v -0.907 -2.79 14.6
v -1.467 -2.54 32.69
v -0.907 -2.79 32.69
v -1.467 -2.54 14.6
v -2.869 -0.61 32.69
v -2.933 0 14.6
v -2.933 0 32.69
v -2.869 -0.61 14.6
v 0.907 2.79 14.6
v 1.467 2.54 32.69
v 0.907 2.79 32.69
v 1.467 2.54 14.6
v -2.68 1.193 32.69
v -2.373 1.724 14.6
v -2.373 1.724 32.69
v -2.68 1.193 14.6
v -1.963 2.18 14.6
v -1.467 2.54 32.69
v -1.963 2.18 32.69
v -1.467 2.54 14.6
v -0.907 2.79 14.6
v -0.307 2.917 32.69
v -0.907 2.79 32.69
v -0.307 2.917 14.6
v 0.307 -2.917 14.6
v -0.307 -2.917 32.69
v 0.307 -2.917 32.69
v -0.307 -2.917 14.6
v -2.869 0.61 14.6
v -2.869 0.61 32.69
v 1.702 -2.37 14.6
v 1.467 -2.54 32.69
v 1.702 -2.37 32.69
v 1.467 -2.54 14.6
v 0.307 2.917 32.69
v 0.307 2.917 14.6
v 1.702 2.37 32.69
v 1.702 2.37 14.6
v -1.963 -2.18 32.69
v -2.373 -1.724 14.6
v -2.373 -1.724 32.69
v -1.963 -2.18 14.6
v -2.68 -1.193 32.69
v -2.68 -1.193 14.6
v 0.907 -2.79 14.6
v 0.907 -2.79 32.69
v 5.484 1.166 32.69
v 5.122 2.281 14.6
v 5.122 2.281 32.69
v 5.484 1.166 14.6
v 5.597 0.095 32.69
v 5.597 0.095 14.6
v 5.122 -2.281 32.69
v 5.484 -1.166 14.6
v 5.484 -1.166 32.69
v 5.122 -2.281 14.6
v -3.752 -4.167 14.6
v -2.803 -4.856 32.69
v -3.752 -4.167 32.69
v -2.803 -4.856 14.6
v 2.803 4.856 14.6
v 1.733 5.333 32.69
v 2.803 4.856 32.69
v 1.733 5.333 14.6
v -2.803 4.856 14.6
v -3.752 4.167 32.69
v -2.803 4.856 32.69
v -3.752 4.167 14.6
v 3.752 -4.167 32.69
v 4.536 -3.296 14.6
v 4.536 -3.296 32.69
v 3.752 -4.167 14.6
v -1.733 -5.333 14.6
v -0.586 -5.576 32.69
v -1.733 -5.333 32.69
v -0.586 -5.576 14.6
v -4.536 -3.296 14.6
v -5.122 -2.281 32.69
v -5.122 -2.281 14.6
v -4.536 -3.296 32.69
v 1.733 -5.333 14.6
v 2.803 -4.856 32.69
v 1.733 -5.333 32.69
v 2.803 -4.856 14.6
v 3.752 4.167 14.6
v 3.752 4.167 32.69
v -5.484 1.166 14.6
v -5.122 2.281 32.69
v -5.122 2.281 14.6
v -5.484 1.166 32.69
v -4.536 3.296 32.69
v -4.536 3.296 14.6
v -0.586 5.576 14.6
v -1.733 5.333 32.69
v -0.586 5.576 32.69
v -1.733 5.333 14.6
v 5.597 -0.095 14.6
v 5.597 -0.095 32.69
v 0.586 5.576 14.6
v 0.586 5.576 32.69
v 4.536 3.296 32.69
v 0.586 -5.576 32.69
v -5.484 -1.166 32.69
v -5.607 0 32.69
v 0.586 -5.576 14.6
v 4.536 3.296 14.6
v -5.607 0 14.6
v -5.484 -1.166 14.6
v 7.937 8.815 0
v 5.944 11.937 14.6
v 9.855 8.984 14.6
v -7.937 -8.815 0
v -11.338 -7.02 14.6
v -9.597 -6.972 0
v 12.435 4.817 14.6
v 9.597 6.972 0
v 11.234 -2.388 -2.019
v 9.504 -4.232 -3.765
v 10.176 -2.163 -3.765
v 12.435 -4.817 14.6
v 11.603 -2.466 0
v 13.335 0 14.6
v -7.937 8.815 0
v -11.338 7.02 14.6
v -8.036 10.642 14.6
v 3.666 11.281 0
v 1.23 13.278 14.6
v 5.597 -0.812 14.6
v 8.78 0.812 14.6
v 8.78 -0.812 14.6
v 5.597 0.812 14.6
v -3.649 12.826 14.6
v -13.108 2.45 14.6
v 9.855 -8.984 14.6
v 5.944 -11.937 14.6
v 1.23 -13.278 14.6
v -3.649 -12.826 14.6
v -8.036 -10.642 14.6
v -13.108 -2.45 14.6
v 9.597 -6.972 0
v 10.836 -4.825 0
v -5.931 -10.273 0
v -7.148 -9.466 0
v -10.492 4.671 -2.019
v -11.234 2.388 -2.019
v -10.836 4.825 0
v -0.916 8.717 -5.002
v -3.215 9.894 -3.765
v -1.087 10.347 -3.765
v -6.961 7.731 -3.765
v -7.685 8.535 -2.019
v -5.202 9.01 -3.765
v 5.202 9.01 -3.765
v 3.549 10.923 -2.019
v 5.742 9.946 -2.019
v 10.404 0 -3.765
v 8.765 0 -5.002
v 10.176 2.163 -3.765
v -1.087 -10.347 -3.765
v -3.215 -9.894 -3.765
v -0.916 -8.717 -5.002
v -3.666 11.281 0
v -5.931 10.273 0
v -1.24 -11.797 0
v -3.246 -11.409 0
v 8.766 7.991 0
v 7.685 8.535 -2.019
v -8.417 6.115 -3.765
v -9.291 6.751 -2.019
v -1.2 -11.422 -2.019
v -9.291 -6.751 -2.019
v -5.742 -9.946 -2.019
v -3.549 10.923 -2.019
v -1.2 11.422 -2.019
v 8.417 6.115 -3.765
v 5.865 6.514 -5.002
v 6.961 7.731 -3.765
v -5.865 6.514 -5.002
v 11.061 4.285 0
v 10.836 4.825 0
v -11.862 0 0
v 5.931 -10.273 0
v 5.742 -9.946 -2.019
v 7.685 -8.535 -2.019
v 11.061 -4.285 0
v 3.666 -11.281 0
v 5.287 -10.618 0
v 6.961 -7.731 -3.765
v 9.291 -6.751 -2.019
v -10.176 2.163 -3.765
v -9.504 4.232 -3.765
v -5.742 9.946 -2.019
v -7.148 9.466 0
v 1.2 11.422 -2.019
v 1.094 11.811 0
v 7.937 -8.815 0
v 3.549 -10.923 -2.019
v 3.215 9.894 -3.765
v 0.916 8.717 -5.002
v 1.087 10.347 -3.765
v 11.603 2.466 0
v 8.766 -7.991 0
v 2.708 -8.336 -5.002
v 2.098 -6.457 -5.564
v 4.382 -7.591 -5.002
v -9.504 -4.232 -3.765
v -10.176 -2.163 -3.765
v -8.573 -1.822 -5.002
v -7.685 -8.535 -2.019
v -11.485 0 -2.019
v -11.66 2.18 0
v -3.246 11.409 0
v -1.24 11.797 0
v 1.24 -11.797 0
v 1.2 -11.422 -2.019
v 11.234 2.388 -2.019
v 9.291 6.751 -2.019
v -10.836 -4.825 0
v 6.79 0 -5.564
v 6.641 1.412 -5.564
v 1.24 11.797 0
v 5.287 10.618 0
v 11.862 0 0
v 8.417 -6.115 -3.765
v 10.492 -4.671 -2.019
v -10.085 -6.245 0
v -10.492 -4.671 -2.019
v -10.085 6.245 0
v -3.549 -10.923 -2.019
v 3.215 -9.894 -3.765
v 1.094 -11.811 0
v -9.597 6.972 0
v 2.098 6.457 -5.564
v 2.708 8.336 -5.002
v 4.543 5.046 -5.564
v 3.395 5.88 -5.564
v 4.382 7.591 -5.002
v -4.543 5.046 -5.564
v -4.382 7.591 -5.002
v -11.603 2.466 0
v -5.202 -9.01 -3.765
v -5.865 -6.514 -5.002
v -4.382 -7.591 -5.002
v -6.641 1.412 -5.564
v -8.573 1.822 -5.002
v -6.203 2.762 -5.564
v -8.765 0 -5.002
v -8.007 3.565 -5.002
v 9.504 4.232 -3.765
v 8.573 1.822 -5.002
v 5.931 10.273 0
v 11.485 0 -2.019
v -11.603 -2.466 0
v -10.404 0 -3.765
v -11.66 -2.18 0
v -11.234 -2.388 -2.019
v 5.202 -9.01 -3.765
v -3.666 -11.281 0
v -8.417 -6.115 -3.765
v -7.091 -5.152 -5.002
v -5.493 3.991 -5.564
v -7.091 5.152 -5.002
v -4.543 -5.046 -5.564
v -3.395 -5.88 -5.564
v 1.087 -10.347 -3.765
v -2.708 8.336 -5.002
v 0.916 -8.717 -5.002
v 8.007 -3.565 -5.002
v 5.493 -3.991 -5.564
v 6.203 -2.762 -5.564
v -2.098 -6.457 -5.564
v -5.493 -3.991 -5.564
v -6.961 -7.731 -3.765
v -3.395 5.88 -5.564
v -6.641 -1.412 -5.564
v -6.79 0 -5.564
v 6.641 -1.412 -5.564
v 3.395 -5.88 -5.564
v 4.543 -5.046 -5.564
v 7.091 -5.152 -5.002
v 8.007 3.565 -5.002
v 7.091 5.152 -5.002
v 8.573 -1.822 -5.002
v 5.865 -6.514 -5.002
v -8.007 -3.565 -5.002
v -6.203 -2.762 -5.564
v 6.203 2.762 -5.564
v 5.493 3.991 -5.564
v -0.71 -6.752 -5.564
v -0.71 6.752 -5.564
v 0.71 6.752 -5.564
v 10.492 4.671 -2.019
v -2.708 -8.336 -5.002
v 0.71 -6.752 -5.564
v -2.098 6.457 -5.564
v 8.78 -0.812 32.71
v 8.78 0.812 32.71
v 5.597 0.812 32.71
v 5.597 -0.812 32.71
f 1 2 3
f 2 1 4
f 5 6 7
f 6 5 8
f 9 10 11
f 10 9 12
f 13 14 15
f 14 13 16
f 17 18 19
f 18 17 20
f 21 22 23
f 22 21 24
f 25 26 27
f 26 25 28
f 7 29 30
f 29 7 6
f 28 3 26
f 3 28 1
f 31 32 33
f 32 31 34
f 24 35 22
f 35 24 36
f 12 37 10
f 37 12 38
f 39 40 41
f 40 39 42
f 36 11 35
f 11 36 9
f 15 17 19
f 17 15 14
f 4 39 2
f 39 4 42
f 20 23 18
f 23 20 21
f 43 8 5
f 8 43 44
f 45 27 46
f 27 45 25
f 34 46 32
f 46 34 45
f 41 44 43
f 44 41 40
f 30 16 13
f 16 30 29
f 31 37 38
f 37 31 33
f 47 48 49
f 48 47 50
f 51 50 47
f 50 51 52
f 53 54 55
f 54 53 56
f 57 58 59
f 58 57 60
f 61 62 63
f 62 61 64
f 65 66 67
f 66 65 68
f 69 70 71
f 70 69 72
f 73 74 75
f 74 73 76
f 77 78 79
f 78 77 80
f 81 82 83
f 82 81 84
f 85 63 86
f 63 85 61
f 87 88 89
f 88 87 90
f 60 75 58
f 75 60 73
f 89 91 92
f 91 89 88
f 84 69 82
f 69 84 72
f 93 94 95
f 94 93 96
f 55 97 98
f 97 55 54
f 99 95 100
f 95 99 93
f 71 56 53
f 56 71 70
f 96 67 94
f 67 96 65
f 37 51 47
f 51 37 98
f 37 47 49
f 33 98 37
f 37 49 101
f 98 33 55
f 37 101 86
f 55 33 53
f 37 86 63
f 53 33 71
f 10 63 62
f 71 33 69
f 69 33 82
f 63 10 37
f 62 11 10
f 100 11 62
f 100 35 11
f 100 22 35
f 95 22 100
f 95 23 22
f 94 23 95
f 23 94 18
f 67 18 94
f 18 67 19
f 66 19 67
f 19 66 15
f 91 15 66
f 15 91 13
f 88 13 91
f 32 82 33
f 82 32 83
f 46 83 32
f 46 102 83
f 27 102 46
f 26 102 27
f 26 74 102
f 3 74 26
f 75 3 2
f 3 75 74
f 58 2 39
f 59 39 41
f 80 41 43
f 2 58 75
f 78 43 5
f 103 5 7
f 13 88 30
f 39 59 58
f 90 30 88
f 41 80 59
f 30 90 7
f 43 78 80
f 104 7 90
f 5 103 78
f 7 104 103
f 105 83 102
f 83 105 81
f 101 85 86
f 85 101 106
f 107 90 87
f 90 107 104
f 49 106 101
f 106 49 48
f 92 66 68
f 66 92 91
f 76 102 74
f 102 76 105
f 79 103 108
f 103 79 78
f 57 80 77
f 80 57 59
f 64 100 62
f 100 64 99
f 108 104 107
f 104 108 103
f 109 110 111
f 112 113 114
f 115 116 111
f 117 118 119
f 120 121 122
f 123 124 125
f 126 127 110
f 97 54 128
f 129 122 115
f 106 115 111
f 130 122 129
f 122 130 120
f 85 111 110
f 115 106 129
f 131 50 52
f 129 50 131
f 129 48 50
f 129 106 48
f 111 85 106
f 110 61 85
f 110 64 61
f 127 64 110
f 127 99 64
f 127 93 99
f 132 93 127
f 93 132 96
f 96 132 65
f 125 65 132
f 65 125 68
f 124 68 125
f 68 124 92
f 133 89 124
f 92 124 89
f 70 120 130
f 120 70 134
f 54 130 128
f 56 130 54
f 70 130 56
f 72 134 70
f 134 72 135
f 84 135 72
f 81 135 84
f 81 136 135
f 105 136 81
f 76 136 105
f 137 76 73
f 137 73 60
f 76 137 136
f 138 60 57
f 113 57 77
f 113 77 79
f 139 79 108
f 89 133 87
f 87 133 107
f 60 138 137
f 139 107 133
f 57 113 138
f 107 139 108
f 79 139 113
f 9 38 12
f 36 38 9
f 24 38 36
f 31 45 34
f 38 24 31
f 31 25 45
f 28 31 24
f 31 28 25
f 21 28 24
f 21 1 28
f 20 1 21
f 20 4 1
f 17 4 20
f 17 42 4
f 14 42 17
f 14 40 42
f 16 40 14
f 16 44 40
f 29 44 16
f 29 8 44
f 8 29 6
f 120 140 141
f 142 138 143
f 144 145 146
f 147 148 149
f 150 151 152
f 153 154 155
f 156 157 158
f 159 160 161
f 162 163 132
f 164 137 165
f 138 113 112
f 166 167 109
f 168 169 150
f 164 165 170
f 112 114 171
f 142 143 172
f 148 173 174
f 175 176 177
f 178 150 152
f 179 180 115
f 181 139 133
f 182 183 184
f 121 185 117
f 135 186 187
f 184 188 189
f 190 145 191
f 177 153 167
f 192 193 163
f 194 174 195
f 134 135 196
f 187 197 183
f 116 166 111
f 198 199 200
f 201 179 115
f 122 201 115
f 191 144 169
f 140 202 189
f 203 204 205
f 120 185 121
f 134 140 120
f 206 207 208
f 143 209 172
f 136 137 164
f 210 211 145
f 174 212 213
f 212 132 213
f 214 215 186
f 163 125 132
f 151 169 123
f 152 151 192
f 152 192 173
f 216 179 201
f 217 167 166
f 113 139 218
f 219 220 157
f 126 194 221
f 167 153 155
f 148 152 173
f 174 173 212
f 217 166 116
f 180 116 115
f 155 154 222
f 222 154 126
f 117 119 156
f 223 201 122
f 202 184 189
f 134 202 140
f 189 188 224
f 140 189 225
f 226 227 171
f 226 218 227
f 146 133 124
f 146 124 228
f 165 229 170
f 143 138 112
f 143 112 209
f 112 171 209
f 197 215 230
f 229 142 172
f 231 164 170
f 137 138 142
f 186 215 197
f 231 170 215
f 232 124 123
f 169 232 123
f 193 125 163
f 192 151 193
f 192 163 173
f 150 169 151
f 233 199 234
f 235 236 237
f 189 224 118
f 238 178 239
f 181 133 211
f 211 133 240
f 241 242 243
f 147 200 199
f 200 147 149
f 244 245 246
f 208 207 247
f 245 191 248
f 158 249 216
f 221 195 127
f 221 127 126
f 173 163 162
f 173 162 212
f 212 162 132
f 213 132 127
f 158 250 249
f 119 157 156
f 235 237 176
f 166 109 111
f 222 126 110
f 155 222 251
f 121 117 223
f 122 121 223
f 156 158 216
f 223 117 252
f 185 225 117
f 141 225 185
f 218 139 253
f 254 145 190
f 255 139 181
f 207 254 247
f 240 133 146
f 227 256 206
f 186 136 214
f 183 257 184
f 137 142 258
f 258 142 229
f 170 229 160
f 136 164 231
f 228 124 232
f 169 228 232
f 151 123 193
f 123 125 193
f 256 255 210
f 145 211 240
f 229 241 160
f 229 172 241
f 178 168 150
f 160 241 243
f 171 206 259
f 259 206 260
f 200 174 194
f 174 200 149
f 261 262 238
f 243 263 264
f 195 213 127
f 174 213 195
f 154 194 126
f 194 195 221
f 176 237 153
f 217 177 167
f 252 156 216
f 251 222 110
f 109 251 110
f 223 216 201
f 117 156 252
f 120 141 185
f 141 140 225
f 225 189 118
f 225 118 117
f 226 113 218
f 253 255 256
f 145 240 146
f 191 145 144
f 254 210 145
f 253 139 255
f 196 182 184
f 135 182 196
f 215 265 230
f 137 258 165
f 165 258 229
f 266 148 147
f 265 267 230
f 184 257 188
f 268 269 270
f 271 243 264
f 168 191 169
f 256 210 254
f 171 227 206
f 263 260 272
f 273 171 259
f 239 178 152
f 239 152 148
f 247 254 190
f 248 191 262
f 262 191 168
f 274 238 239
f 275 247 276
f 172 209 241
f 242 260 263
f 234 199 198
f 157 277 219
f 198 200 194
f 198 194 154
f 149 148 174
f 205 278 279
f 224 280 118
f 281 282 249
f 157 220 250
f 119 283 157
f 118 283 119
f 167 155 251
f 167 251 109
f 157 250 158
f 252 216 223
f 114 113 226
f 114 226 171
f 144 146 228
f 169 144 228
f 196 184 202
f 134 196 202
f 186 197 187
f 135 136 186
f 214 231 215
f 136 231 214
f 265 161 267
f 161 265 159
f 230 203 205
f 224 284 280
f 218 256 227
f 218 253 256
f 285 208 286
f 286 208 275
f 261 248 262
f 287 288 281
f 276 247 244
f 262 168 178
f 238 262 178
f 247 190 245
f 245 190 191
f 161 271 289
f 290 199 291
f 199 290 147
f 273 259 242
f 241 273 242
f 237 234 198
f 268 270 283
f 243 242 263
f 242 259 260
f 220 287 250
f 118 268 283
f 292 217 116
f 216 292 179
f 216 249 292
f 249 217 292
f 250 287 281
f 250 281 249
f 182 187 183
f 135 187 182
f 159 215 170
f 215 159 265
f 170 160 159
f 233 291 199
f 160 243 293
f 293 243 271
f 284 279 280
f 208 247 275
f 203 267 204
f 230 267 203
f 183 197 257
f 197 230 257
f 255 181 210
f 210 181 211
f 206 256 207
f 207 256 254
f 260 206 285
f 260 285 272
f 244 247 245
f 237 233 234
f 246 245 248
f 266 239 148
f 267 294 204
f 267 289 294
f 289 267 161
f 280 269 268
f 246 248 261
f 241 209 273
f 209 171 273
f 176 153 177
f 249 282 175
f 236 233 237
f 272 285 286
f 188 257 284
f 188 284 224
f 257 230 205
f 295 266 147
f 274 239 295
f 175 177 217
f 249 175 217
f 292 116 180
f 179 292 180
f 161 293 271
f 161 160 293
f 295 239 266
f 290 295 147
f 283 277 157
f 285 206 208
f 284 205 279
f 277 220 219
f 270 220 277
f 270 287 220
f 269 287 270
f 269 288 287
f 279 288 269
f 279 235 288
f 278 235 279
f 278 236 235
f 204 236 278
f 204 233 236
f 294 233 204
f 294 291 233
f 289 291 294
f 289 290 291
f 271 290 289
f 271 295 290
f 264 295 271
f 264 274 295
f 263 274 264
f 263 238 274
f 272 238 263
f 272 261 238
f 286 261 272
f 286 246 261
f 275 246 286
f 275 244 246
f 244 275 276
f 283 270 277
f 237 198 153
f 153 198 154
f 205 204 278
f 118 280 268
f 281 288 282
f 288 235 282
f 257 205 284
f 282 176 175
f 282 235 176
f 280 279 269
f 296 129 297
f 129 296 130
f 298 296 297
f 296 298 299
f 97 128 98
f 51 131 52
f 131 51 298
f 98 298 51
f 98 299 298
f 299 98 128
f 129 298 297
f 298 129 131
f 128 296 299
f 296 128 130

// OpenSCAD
// [FL_INDEX: keywords="openscad, 3d_parametric, Customizable_General_Purpose_Knob, csg_solid" | COT="Parametric OpenSCAD design from 3DCodeverse"]
// Title: Customizable General Purpose Knob

//****************************************************
//****************************************************
//General purpose keyed knob.
//by Marc Sulfridge
//****************************************************
//****************************************************

//****************************************************
//Start of user defined parameters.
//****************************************************

//Radius of the rounded fillet at the base of the knob.
fillet_r = 5.588; // [1:10]
//Narrow (bottom) radius of the knob.
min_r = 11.862; // [5:20]
//Wide (top) radius of the knob.
max_r = 13.335; // [5:20]
//Total height of the knob base.
base_h = 20.188; // [5:50]
//Calculated height of the non-fillet portion of the base.
cyl_h = base_h - fillet_r;
//Number of facets for base circle.
base_res = 17; // [10,11,12,13,14,15,16,17,18,19,20]
//Outer shaft radius.
shaft_r = 5.607; // [1:10]
// Shaft height.
shaft_h = 18.1; // [5:50]
//Inner shaft radius.
shaft_in_r = 2.9335; // [0.5:8]
//Width from shaft flat to edge of shaft inner radius.
shaft_in_min_wid = 4.6355; // [0.5:16]
//Number of facets for shaft circle.
shaft_res = 30; // [20,22,24,26,28,30,32,34,36,38,40]
//Thickness of shaft key.
key_th = 1.625; // [0.25:4]
//Width of shaft key from shaft outer radius to end of key.
key_wid = 3.183; // [1:20]
//Number that is large compared to dimensions of the knob.
BIG = 40; // [30,40,50,60,70,80,90,100]
//Fudge factor to ensure overlaps.
dt = 0.01; // [0.001,0.01,0.1]
//****************************************************

// preview[view:north west, tilt:top diagonal]

union(){
	hull(){
		rotate_extrude(convexity = 10){
			translate([min_r-fillet_r, 0])
			circle(r = fillet_r,$fn=base_res);
		}
	cylinder(r1=min_r,r2=max_r,h=cyl_h,center=false,$fn=base_res);
	}

	translate([0,0,cyl_h-dt])
	difference(){
		cylinder(r=shaft_r,h=shaft_h,center=false,$fn=shaft_res);

		difference(){
			cylinder(r=shaft_in_r,h=shaft_h+2*dt,center=false,$fn=shaft_res);

			translate([shaft_in_min_wid-shaft_in_r,-BIG/2,-BIG/2])
			cube([BIG,BIG,BIG],center=false);
		}
	}

	translate([shaft_r-dt,-key_th/2,cyl_h-dt])
	cube([key_wid,key_th,shaft_h+2*dt],center=false);
}
